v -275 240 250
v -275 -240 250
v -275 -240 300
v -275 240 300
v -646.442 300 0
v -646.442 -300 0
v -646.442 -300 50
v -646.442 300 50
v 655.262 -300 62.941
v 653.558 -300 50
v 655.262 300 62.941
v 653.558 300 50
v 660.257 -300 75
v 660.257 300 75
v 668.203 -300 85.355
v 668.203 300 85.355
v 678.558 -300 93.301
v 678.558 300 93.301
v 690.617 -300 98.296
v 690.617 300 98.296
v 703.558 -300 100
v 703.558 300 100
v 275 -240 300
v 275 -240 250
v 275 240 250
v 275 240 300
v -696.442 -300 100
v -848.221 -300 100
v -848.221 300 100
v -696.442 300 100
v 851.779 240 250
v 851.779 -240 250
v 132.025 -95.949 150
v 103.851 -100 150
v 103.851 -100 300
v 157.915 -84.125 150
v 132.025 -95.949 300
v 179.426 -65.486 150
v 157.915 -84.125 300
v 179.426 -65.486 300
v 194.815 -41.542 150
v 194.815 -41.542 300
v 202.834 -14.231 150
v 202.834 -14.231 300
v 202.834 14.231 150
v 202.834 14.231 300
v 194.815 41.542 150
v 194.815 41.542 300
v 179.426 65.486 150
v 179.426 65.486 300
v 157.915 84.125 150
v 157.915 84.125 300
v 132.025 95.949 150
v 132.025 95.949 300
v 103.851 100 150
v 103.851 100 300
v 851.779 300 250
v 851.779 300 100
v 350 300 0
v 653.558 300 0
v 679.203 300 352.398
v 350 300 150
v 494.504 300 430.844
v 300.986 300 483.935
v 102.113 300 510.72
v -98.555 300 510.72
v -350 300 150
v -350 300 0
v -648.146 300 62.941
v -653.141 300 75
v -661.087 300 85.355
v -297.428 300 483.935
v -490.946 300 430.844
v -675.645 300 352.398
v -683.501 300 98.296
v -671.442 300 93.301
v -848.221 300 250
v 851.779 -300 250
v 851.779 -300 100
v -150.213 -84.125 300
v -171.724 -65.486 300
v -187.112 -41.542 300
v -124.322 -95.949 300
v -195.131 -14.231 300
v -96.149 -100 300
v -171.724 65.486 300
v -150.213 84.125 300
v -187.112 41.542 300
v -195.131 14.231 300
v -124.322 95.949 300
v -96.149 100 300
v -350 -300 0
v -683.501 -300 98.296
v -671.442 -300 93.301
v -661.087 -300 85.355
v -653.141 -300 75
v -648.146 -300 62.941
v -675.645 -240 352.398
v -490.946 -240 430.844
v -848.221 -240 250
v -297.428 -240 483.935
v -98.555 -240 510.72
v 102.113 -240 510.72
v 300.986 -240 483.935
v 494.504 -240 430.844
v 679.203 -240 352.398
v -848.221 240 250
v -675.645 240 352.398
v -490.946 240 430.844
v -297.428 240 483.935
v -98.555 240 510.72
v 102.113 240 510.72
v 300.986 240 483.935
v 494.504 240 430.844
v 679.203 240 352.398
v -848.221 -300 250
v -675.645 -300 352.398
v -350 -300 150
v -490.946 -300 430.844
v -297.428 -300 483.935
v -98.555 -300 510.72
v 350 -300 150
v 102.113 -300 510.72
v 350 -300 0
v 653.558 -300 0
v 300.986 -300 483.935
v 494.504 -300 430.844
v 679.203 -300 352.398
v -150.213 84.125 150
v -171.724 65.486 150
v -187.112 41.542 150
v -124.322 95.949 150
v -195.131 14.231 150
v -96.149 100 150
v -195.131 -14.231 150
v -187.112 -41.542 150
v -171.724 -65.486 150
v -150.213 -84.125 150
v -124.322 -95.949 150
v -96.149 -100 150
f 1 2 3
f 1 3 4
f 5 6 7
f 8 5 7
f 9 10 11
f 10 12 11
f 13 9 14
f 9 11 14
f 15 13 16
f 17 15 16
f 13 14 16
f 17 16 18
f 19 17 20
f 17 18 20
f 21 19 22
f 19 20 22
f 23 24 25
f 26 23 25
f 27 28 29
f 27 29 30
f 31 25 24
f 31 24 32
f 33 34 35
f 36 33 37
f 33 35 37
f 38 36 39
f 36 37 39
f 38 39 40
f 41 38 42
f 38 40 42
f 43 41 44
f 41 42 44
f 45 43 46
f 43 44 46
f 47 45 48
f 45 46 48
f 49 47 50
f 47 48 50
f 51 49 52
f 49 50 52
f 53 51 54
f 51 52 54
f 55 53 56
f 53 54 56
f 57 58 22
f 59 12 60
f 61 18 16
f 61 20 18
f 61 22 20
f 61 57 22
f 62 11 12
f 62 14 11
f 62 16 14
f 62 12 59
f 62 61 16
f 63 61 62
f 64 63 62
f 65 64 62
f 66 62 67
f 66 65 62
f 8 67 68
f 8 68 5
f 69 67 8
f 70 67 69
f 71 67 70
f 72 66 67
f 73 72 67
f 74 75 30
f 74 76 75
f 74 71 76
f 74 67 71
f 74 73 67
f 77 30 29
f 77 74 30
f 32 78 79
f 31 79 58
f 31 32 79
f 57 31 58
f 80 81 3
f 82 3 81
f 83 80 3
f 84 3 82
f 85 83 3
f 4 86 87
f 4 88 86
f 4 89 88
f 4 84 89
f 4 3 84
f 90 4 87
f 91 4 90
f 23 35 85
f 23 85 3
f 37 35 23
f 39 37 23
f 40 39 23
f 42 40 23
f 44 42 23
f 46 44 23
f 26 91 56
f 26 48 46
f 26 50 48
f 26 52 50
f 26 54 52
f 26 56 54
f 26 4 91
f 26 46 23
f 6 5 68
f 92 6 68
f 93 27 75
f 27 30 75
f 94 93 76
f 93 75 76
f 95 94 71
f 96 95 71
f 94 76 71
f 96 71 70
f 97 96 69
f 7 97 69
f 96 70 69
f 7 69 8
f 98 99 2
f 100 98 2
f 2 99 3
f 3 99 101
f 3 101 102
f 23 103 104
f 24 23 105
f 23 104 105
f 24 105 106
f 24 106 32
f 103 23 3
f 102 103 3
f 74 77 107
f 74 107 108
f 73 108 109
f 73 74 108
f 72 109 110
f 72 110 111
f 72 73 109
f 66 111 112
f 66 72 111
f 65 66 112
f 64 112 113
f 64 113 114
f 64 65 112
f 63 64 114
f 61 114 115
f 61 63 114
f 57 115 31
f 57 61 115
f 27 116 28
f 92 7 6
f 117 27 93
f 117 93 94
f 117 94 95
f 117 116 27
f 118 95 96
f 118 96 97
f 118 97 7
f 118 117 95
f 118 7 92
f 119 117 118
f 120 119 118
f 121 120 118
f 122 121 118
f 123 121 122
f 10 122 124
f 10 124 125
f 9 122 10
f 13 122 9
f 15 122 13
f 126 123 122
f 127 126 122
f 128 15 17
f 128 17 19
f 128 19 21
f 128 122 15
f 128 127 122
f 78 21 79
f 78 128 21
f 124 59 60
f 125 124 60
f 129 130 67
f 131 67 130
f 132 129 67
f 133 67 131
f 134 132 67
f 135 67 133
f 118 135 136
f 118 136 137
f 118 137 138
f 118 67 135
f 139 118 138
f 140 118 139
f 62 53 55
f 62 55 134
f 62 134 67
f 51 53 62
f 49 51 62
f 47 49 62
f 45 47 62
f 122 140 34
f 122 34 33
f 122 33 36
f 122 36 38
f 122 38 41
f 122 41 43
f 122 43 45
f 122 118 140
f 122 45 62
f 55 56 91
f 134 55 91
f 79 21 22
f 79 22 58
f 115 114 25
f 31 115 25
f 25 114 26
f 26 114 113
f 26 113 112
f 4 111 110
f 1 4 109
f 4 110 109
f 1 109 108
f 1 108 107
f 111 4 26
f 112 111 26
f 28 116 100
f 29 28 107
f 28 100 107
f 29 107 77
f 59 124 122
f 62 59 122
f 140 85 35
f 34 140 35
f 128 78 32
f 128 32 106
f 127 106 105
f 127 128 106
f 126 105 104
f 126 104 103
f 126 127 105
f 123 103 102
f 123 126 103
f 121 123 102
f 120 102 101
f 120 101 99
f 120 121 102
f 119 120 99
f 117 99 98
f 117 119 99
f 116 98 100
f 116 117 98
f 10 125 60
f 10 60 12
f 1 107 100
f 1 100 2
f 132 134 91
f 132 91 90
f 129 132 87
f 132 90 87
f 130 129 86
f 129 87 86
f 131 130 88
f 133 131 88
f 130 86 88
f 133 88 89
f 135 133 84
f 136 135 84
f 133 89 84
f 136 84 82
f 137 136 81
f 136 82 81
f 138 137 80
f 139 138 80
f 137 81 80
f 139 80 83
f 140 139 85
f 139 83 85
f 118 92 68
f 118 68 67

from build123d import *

# Parameters (mm, degrees)
F0_W      = 1700
F0_H      = 480
F1_DEPTH  = 250
F2_W      = 1700
F2_H      = 60
F3_DEPTH  = 250
F5_DEPTH  = 60
F7_DEPTH  = 60
F8_W      = 550
F8_H      = 480
F9_DEPTH  = 50
F11_DEPTH = 300.001
F12_W     = 700
F12_H     = 300
F13_DEPTH = 600.001
F14_W     = 403.557981
F14_H     = 200
F15_DEPTH = 600.001
F16_R     = 50
F17_W     = 396.442019
F17_H     = 200
F18_DEPTH = 600.001
F19_R     = 50


with BuildPart() as f1:
    # F0 (on Top) → F1 (new body)
    with BuildSketch(Plane.XY):
        with Locations((1.77899, 0)):
            Rectangle(F0_W, F0_H)
    extrude(amount=F1_DEPTH)

    # F2 (on face) → F3 (join)
    with BuildSketch(Plane.XY.offset(250)):
        with Locations((1.77899, -270)):
            Rectangle(F2_W, F2_H)
        with Locations((1.77899, 270)):
            Rectangle(F2_W, F2_H)
    extrude(amount=-F3_DEPTH)

    # F4 (on face) → F5 (join)
    with BuildSketch(Plane.XZ.offset(300)):
        with BuildLine():
            Line((-848.22101, 250), (851.77899, 250))
            ThreePointArc((851.77899, 250), (1.77899, 514.079291), (-848.22101, 250))
        make_face()
    extrude(amount=-F5_DEPTH)

    # F6 (on face) → F7 (join)
    with BuildSketch(Plane(origin=(0, 300, 0), x_dir=(-1, 0, 0), z_dir=(0, 1, 0))):
        with BuildLine():
            Line((-851.77899, 250), (848.22101, 250))
            ThreePointArc((848.22101, 250), (-1.77899, 514.079291), (-851.77899, 250))
        make_face()
    extrude(amount=-F7_DEPTH)

    # F8 (on face) → F9 (join)
    with BuildSketch(Plane.XY.offset(250)):
        Rectangle(F8_W, F8_H)
    extrude(amount=F9_DEPTH)

    # F10 (on face) → F11 (cut, through all)
    with BuildSketch(Plane.XY.offset(300)):
        with BuildLine():
            Line((-96.148637, -100), (103.851363, -100))
            ThreePointArc((103.851363, -100), (203.851363, 0), (103.851363, 100))
            Line((103.851363, 100), (-96.148637, 100))
            ThreePointArc((-96.148637, 100), (-196.148637, 0), (-96.148637, -100))
        make_face()
    extrude(amount=-F11_DEPTH, mode=Mode.SUBTRACT)

    # F12 (on face) → F13 (cut, through all)
    with BuildSketch(Plane.XZ.offset(300)):
        Rectangle(F12_W, F12_H)
    extrude(amount=-F13_DEPTH, mode=Mode.SUBTRACT)

    # F14 (on face) → F15 (cut, through all)
    with BuildSketch(Plane.XZ.offset(300)):
        with Locations((-848.22101, 0)):
            Rectangle(F14_W, F14_H)
    extrude(amount=-F15_DEPTH, mode=Mode.SUBTRACT)

    # F16
    f16_edges = [f1.edges().sort_by_distance(p)[0] for p in [
        (-646.442019, 0, 100),
    ]]
    fillet(f16_edges, radius=F16_R)

    # F17 (on face) → F18 (cut, through all)
    with BuildSketch(Plane.XZ.offset(300)):
        with Locations((851.77899, 0)):
            Rectangle(F17_W, F17_H)
    extrude(amount=-F18_DEPTH, mode=Mode.SUBTRACT)

    # F19
    f19_edges = [f1.edges().sort_by_distance(p)[0] for p in [
        (653.557981, 0, 100),
    ]]
    fillet(f19_edges, radius=F19_R)


solid = f1.part
